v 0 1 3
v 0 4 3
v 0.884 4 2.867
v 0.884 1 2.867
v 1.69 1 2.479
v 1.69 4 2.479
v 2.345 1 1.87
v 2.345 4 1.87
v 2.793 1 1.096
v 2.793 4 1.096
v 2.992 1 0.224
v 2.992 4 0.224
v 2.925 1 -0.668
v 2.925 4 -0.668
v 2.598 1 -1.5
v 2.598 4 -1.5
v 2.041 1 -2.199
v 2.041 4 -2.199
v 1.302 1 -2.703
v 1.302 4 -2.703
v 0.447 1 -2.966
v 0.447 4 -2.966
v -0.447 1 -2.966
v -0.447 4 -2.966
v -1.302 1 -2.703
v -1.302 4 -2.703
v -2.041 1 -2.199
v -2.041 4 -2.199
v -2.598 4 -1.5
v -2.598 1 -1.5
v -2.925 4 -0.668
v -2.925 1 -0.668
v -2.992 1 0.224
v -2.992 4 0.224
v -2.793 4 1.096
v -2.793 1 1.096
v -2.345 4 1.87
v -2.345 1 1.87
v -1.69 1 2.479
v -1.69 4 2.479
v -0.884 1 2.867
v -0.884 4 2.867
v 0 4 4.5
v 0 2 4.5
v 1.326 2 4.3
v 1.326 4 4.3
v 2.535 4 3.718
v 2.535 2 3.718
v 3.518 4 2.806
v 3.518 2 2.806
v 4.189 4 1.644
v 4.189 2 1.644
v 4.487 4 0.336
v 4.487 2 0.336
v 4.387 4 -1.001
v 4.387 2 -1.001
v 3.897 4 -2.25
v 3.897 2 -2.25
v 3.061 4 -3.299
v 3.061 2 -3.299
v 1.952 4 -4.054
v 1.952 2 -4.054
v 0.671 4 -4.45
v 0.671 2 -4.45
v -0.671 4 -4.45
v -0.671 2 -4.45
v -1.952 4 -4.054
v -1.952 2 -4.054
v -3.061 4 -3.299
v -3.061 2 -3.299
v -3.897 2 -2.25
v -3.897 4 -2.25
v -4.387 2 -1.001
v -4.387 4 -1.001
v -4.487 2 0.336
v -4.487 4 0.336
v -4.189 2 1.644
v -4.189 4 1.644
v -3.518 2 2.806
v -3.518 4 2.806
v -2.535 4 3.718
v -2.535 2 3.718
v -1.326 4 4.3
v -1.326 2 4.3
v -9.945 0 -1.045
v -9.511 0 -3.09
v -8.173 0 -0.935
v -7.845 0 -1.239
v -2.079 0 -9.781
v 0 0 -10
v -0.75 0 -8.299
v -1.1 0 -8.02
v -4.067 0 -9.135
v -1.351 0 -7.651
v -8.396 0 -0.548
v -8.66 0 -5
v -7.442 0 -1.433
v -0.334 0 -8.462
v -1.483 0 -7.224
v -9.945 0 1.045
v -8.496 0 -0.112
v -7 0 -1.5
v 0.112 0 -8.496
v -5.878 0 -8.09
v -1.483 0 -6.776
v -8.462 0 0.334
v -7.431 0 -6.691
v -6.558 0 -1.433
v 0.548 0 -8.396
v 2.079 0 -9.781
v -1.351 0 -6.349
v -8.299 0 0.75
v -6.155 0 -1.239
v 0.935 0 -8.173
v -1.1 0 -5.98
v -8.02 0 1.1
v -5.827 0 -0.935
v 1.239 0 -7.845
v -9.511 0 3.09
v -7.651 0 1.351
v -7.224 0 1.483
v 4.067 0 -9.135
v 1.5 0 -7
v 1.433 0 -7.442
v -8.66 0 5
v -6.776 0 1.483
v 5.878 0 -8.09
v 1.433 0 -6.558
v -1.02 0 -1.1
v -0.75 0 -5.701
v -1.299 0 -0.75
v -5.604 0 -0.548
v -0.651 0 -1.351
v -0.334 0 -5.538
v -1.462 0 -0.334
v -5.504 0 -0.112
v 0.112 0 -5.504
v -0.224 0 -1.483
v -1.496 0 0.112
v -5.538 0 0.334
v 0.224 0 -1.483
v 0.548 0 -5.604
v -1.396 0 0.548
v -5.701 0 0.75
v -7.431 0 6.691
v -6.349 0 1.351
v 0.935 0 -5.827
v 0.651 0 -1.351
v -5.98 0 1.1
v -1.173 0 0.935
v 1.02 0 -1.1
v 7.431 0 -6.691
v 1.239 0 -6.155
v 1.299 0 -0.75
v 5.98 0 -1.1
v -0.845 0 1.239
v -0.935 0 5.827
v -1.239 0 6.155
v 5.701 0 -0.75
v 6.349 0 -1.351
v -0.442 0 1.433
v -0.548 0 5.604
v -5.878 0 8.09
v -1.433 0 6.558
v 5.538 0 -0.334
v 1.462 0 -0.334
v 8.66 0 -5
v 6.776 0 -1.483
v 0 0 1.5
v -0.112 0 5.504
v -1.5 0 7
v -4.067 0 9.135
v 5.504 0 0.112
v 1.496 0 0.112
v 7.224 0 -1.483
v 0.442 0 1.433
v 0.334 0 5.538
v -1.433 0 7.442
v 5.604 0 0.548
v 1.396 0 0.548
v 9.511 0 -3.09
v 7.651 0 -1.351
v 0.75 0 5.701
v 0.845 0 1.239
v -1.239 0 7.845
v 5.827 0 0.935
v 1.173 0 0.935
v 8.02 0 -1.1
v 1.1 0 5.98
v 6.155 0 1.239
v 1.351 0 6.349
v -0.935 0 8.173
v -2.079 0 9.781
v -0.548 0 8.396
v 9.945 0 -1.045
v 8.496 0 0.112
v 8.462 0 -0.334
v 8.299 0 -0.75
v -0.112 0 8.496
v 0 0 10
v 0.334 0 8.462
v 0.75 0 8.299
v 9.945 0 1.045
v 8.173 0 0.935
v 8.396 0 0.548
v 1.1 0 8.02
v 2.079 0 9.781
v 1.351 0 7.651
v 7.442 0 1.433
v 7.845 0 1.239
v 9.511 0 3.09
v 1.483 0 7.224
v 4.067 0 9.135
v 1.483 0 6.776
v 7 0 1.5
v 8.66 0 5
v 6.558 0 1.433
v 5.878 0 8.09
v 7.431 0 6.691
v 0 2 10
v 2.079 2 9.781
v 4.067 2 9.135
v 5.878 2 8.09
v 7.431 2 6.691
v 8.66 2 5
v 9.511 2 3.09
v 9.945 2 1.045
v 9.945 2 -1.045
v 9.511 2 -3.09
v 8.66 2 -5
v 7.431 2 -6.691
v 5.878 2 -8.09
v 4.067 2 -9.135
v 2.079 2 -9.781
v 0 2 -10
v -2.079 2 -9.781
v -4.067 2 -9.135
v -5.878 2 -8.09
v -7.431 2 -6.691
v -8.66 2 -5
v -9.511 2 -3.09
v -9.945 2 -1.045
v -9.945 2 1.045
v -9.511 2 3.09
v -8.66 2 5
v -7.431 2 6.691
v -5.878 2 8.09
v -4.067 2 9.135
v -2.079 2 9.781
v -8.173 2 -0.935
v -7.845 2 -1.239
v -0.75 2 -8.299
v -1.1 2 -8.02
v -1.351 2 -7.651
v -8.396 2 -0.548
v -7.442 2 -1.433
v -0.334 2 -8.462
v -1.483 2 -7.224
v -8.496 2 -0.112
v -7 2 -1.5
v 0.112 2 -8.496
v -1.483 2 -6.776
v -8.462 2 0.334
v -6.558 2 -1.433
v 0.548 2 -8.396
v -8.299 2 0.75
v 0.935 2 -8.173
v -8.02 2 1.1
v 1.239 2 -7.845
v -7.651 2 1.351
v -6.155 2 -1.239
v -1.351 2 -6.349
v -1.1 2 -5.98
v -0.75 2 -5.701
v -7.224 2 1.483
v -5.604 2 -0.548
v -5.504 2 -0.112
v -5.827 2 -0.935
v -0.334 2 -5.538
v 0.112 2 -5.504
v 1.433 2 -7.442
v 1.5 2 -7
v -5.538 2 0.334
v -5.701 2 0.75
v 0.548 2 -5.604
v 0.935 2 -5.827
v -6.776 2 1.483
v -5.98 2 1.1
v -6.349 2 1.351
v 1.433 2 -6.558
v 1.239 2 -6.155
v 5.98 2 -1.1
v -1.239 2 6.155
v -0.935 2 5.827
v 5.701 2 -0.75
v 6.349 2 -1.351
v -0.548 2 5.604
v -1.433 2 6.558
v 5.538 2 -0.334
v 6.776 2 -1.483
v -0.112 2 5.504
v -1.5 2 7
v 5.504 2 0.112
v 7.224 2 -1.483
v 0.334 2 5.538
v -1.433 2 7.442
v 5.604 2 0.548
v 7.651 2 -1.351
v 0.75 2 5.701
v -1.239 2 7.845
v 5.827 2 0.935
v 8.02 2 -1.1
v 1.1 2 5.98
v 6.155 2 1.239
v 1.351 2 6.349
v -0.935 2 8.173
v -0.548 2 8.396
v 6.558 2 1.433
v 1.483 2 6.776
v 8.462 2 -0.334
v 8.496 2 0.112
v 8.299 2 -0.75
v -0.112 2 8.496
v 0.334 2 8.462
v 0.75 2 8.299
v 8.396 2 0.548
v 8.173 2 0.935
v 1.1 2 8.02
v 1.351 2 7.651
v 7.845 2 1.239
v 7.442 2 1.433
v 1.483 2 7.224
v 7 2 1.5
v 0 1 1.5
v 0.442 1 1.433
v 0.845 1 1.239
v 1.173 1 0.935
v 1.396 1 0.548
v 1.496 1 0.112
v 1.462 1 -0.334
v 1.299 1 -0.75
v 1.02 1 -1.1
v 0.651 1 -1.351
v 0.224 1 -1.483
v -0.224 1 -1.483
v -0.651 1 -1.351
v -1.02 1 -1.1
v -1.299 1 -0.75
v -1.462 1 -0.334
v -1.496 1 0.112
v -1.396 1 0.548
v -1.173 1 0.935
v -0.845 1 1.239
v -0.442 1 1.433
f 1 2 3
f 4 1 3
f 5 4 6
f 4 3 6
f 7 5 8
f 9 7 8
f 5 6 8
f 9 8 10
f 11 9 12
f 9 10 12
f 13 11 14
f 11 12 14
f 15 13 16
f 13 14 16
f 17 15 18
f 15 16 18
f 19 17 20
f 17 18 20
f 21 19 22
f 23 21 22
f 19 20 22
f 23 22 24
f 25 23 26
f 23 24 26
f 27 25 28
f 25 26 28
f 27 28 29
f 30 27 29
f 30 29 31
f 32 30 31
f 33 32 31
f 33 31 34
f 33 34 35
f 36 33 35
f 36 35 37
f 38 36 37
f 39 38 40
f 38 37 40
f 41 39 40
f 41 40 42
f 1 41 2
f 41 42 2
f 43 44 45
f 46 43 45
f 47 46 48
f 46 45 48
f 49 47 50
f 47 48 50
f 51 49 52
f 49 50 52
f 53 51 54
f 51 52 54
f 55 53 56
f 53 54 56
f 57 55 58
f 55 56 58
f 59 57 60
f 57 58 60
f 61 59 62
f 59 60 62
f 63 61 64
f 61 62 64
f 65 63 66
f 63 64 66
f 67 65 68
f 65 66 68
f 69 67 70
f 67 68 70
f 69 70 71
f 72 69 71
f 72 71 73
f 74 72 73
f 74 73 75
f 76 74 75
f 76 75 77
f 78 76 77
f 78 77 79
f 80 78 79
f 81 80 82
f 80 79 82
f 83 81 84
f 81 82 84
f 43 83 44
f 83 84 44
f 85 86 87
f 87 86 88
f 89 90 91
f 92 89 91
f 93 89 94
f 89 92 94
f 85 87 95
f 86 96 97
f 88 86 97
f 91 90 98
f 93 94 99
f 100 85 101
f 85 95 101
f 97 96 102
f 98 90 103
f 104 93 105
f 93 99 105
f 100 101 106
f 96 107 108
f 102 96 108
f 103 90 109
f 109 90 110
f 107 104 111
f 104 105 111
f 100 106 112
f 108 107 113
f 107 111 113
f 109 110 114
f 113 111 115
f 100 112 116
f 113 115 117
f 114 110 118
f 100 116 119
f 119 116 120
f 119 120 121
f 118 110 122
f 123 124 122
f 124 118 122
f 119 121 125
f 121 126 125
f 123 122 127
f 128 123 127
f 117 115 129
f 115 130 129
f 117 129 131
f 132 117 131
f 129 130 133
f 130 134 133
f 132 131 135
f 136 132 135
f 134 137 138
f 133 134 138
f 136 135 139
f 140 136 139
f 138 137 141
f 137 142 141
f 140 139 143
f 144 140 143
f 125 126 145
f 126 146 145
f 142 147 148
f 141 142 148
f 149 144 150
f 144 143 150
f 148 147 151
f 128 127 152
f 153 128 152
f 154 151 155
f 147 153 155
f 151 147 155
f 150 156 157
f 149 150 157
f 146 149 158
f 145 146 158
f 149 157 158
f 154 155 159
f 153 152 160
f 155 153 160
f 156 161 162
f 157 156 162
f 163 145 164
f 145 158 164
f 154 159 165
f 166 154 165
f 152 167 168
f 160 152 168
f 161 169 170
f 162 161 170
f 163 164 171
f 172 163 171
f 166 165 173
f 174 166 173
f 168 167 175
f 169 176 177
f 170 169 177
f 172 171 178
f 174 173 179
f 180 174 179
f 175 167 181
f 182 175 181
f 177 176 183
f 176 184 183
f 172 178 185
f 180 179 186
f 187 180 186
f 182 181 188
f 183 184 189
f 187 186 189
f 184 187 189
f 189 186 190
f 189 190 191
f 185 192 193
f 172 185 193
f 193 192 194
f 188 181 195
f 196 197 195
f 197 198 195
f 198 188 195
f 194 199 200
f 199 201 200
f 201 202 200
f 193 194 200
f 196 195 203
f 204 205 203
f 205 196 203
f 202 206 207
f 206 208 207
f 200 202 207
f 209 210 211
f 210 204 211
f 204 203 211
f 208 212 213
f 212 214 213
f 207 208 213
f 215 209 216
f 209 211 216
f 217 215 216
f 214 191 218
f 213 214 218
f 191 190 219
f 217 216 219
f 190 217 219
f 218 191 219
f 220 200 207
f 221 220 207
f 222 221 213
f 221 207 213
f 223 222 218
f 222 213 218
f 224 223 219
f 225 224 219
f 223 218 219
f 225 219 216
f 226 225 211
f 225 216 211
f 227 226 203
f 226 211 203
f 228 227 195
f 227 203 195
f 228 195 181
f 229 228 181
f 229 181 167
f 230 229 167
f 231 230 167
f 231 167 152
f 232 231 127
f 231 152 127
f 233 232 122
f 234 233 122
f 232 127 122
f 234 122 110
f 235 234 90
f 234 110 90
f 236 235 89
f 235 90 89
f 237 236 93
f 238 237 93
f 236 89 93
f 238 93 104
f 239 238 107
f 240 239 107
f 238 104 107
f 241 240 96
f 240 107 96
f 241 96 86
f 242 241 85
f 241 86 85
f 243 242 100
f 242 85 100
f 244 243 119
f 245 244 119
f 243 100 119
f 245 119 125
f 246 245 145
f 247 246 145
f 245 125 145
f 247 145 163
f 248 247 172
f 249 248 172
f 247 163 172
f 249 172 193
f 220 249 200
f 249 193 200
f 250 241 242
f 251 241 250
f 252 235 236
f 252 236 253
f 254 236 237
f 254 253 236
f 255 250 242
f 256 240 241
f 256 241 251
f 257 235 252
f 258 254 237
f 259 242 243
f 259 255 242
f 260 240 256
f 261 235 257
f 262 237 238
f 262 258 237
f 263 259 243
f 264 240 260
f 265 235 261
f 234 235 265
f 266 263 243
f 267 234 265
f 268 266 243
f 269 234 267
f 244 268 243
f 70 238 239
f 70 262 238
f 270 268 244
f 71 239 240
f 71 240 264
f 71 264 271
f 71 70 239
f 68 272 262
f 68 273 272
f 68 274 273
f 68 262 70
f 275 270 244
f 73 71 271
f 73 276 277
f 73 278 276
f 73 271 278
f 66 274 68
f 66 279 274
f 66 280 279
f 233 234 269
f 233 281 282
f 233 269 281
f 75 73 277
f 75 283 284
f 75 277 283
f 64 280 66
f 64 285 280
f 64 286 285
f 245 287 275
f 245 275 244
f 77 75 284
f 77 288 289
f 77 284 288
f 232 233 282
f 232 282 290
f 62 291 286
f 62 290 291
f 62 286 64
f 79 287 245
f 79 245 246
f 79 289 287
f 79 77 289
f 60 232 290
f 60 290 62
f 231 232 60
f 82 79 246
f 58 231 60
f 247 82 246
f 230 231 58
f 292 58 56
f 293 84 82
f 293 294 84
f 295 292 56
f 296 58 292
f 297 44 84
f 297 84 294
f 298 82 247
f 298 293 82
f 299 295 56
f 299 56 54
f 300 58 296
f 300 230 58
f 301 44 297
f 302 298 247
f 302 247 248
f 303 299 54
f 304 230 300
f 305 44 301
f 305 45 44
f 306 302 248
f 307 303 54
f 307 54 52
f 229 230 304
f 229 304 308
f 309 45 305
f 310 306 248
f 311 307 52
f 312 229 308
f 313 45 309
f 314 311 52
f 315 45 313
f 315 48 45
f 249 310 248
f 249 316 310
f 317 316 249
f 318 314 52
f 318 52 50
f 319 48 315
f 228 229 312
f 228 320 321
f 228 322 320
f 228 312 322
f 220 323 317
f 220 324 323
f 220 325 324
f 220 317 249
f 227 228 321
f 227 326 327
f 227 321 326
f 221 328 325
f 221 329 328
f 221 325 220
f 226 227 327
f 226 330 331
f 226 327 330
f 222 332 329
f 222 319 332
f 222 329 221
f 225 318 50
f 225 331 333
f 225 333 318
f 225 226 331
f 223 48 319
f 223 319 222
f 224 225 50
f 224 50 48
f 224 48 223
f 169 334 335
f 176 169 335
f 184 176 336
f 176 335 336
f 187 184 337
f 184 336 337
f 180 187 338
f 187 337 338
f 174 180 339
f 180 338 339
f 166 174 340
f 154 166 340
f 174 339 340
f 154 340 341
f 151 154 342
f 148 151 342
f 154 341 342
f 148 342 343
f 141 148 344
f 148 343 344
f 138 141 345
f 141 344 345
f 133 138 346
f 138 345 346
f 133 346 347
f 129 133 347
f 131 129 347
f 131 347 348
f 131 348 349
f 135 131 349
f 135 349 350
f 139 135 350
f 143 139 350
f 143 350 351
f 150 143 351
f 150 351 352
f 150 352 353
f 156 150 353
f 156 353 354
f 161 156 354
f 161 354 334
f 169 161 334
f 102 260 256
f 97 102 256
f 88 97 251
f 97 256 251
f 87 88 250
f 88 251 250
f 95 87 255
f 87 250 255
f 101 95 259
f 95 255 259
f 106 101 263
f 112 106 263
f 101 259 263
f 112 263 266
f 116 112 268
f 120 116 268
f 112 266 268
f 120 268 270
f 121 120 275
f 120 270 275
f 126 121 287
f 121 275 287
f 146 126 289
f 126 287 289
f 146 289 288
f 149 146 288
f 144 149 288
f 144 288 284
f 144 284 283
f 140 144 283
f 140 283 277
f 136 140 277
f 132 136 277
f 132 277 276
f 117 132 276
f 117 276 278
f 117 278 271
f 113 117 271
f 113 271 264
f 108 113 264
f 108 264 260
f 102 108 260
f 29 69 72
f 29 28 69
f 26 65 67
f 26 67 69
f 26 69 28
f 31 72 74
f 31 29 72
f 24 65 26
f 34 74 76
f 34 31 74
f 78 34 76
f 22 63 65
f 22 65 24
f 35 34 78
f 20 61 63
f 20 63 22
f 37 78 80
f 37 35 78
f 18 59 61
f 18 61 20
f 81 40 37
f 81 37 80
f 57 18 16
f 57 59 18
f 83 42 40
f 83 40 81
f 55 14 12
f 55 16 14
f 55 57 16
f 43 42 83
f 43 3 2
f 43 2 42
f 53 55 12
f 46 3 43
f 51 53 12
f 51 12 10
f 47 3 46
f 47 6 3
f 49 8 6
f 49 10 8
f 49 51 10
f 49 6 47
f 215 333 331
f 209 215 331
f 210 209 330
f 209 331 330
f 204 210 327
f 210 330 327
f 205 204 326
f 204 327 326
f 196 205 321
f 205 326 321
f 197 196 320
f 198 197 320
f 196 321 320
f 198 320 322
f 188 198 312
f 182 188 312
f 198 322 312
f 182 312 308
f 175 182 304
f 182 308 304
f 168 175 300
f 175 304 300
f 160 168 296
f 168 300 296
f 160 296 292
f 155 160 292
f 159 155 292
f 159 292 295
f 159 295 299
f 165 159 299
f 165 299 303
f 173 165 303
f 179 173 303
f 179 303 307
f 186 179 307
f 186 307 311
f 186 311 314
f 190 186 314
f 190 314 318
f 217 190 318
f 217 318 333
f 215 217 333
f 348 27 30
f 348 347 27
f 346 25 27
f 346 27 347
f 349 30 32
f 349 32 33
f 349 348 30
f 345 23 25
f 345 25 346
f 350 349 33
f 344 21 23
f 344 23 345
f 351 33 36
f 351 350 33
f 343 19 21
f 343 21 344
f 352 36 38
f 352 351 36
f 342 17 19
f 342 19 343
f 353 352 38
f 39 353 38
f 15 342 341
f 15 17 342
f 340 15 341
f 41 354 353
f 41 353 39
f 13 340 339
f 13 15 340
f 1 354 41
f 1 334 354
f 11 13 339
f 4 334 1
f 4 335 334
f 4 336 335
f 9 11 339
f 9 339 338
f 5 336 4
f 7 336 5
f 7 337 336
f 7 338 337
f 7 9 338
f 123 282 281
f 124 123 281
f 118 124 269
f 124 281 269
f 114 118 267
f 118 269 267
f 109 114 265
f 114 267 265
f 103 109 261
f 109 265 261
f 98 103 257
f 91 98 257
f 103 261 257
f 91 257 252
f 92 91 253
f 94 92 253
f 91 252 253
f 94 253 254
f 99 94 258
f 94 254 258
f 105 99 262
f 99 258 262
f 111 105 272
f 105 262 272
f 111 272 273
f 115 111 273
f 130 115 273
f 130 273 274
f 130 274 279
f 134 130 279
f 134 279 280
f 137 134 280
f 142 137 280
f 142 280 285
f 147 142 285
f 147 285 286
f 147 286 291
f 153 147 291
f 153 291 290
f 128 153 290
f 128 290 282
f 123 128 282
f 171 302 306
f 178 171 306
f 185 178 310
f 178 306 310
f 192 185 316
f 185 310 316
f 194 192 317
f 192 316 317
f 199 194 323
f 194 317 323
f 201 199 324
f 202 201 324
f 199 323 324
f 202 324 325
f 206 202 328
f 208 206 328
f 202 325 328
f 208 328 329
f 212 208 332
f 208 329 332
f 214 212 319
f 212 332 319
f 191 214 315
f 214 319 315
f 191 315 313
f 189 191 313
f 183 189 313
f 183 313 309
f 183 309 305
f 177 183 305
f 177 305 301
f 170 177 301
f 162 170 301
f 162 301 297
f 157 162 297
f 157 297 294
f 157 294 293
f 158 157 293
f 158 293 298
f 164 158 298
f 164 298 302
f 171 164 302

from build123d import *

# Parameters (mm, degrees)
SKETCH_1_R               = 10
EXTRUDE_351_DEPTH        = 2
SKETCH_2_R               = 4.5
EXTRUDE_436_DEPTH        = 2
SKETCH_3_R               = 3
CUT_EXTRUDE_526_DEPTH    = 3
SKETCH_4_R               = 1.5
CUT_EXTRUDE_623_DEPTH    = 15.456832295
SKETCH_5_R               = 1.5
CUT_EXTRUDE_727_DEPTH    = 15.282856857
PATTERN_CIRCULAR_1_COUNT = 4


with BuildPart() as part:
    # Эскиз1 → Extrude 351 (new body)
    with BuildSketch(Plane(origin=(0, 0, 0), x_dir=(1, 0, 0), z_dir=(0, 1, 0))):
        with Locations(Location((0, 0, 0), (0, 0, 270))):
            Circle(SKETCH_1_R)
    extrude(amount=EXTRUDE_351_DEPTH)

    # Эскиз2 → Extrude 436 (add)
    with BuildSketch(Plane(origin=(0, 2, 0), x_dir=(1, 0, 0), z_dir=(0, 1, 0))):
        with Locations(Location((0, 0, 0), (0, 0, 270))):
            Circle(SKETCH_2_R)
    extrude(amount=EXTRUDE_436_DEPTH)

    # Эскиз3 → Cut-Extrude 526 (cut)
    with BuildSketch(Plane(origin=(0, 4, 0), x_dir=(1, 0, 0), z_dir=(0, 1, 0))):
        with Locations(Location((0, 0, 0), (0, 0, 270))):
            Circle(SKETCH_3_R)
    extrude(amount=-CUT_EXTRUDE_526_DEPTH, mode=Mode.SUBTRACT)

    # Эскиз4 → Cut-Extrude 623 (cut, through all)
    with BuildSketch(Plane(origin=(0, 1, 0), x_dir=(1, 0, 0), z_dir=(0, 1, 0))):
        with Locations(Location((0, 0, 0), (0, 0, 270))):
            Circle(SKETCH_4_R)
    extrude(amount=-CUT_EXTRUDE_623_DEPTH, mode=Mode.SUBTRACT)

    # Эскиз5 → Cut-Extrude 727 (cut, through all)
    with BuildSketch(Plane(origin=(0, 2, 0), x_dir=(1, 0, 0), z_dir=(0, 1, 0))):
        with Locations(Location((7, 0, 0), (0, 0, 270))):
            Circle(SKETCH_5_R)
    cut_extrude_727 = extrude(amount=-CUT_EXTRUDE_727_DEPTH, mode=Mode.SUBTRACT)

    # Круговой массив1: Cut-Extrude 727 ×4 about axis
    pattern_circular_1_axis = Axis((0, 0, 0), (0, 1, 0))
    for i in range(1, PATTERN_CIRCULAR_1_COUNT):
        add(cut_extrude_727.rotate(pattern_circular_1_axis, i * 360 / PATTERN_CIRCULAR_1_COUNT), mode=Mode.SUBTRACT)


solid = part.part
